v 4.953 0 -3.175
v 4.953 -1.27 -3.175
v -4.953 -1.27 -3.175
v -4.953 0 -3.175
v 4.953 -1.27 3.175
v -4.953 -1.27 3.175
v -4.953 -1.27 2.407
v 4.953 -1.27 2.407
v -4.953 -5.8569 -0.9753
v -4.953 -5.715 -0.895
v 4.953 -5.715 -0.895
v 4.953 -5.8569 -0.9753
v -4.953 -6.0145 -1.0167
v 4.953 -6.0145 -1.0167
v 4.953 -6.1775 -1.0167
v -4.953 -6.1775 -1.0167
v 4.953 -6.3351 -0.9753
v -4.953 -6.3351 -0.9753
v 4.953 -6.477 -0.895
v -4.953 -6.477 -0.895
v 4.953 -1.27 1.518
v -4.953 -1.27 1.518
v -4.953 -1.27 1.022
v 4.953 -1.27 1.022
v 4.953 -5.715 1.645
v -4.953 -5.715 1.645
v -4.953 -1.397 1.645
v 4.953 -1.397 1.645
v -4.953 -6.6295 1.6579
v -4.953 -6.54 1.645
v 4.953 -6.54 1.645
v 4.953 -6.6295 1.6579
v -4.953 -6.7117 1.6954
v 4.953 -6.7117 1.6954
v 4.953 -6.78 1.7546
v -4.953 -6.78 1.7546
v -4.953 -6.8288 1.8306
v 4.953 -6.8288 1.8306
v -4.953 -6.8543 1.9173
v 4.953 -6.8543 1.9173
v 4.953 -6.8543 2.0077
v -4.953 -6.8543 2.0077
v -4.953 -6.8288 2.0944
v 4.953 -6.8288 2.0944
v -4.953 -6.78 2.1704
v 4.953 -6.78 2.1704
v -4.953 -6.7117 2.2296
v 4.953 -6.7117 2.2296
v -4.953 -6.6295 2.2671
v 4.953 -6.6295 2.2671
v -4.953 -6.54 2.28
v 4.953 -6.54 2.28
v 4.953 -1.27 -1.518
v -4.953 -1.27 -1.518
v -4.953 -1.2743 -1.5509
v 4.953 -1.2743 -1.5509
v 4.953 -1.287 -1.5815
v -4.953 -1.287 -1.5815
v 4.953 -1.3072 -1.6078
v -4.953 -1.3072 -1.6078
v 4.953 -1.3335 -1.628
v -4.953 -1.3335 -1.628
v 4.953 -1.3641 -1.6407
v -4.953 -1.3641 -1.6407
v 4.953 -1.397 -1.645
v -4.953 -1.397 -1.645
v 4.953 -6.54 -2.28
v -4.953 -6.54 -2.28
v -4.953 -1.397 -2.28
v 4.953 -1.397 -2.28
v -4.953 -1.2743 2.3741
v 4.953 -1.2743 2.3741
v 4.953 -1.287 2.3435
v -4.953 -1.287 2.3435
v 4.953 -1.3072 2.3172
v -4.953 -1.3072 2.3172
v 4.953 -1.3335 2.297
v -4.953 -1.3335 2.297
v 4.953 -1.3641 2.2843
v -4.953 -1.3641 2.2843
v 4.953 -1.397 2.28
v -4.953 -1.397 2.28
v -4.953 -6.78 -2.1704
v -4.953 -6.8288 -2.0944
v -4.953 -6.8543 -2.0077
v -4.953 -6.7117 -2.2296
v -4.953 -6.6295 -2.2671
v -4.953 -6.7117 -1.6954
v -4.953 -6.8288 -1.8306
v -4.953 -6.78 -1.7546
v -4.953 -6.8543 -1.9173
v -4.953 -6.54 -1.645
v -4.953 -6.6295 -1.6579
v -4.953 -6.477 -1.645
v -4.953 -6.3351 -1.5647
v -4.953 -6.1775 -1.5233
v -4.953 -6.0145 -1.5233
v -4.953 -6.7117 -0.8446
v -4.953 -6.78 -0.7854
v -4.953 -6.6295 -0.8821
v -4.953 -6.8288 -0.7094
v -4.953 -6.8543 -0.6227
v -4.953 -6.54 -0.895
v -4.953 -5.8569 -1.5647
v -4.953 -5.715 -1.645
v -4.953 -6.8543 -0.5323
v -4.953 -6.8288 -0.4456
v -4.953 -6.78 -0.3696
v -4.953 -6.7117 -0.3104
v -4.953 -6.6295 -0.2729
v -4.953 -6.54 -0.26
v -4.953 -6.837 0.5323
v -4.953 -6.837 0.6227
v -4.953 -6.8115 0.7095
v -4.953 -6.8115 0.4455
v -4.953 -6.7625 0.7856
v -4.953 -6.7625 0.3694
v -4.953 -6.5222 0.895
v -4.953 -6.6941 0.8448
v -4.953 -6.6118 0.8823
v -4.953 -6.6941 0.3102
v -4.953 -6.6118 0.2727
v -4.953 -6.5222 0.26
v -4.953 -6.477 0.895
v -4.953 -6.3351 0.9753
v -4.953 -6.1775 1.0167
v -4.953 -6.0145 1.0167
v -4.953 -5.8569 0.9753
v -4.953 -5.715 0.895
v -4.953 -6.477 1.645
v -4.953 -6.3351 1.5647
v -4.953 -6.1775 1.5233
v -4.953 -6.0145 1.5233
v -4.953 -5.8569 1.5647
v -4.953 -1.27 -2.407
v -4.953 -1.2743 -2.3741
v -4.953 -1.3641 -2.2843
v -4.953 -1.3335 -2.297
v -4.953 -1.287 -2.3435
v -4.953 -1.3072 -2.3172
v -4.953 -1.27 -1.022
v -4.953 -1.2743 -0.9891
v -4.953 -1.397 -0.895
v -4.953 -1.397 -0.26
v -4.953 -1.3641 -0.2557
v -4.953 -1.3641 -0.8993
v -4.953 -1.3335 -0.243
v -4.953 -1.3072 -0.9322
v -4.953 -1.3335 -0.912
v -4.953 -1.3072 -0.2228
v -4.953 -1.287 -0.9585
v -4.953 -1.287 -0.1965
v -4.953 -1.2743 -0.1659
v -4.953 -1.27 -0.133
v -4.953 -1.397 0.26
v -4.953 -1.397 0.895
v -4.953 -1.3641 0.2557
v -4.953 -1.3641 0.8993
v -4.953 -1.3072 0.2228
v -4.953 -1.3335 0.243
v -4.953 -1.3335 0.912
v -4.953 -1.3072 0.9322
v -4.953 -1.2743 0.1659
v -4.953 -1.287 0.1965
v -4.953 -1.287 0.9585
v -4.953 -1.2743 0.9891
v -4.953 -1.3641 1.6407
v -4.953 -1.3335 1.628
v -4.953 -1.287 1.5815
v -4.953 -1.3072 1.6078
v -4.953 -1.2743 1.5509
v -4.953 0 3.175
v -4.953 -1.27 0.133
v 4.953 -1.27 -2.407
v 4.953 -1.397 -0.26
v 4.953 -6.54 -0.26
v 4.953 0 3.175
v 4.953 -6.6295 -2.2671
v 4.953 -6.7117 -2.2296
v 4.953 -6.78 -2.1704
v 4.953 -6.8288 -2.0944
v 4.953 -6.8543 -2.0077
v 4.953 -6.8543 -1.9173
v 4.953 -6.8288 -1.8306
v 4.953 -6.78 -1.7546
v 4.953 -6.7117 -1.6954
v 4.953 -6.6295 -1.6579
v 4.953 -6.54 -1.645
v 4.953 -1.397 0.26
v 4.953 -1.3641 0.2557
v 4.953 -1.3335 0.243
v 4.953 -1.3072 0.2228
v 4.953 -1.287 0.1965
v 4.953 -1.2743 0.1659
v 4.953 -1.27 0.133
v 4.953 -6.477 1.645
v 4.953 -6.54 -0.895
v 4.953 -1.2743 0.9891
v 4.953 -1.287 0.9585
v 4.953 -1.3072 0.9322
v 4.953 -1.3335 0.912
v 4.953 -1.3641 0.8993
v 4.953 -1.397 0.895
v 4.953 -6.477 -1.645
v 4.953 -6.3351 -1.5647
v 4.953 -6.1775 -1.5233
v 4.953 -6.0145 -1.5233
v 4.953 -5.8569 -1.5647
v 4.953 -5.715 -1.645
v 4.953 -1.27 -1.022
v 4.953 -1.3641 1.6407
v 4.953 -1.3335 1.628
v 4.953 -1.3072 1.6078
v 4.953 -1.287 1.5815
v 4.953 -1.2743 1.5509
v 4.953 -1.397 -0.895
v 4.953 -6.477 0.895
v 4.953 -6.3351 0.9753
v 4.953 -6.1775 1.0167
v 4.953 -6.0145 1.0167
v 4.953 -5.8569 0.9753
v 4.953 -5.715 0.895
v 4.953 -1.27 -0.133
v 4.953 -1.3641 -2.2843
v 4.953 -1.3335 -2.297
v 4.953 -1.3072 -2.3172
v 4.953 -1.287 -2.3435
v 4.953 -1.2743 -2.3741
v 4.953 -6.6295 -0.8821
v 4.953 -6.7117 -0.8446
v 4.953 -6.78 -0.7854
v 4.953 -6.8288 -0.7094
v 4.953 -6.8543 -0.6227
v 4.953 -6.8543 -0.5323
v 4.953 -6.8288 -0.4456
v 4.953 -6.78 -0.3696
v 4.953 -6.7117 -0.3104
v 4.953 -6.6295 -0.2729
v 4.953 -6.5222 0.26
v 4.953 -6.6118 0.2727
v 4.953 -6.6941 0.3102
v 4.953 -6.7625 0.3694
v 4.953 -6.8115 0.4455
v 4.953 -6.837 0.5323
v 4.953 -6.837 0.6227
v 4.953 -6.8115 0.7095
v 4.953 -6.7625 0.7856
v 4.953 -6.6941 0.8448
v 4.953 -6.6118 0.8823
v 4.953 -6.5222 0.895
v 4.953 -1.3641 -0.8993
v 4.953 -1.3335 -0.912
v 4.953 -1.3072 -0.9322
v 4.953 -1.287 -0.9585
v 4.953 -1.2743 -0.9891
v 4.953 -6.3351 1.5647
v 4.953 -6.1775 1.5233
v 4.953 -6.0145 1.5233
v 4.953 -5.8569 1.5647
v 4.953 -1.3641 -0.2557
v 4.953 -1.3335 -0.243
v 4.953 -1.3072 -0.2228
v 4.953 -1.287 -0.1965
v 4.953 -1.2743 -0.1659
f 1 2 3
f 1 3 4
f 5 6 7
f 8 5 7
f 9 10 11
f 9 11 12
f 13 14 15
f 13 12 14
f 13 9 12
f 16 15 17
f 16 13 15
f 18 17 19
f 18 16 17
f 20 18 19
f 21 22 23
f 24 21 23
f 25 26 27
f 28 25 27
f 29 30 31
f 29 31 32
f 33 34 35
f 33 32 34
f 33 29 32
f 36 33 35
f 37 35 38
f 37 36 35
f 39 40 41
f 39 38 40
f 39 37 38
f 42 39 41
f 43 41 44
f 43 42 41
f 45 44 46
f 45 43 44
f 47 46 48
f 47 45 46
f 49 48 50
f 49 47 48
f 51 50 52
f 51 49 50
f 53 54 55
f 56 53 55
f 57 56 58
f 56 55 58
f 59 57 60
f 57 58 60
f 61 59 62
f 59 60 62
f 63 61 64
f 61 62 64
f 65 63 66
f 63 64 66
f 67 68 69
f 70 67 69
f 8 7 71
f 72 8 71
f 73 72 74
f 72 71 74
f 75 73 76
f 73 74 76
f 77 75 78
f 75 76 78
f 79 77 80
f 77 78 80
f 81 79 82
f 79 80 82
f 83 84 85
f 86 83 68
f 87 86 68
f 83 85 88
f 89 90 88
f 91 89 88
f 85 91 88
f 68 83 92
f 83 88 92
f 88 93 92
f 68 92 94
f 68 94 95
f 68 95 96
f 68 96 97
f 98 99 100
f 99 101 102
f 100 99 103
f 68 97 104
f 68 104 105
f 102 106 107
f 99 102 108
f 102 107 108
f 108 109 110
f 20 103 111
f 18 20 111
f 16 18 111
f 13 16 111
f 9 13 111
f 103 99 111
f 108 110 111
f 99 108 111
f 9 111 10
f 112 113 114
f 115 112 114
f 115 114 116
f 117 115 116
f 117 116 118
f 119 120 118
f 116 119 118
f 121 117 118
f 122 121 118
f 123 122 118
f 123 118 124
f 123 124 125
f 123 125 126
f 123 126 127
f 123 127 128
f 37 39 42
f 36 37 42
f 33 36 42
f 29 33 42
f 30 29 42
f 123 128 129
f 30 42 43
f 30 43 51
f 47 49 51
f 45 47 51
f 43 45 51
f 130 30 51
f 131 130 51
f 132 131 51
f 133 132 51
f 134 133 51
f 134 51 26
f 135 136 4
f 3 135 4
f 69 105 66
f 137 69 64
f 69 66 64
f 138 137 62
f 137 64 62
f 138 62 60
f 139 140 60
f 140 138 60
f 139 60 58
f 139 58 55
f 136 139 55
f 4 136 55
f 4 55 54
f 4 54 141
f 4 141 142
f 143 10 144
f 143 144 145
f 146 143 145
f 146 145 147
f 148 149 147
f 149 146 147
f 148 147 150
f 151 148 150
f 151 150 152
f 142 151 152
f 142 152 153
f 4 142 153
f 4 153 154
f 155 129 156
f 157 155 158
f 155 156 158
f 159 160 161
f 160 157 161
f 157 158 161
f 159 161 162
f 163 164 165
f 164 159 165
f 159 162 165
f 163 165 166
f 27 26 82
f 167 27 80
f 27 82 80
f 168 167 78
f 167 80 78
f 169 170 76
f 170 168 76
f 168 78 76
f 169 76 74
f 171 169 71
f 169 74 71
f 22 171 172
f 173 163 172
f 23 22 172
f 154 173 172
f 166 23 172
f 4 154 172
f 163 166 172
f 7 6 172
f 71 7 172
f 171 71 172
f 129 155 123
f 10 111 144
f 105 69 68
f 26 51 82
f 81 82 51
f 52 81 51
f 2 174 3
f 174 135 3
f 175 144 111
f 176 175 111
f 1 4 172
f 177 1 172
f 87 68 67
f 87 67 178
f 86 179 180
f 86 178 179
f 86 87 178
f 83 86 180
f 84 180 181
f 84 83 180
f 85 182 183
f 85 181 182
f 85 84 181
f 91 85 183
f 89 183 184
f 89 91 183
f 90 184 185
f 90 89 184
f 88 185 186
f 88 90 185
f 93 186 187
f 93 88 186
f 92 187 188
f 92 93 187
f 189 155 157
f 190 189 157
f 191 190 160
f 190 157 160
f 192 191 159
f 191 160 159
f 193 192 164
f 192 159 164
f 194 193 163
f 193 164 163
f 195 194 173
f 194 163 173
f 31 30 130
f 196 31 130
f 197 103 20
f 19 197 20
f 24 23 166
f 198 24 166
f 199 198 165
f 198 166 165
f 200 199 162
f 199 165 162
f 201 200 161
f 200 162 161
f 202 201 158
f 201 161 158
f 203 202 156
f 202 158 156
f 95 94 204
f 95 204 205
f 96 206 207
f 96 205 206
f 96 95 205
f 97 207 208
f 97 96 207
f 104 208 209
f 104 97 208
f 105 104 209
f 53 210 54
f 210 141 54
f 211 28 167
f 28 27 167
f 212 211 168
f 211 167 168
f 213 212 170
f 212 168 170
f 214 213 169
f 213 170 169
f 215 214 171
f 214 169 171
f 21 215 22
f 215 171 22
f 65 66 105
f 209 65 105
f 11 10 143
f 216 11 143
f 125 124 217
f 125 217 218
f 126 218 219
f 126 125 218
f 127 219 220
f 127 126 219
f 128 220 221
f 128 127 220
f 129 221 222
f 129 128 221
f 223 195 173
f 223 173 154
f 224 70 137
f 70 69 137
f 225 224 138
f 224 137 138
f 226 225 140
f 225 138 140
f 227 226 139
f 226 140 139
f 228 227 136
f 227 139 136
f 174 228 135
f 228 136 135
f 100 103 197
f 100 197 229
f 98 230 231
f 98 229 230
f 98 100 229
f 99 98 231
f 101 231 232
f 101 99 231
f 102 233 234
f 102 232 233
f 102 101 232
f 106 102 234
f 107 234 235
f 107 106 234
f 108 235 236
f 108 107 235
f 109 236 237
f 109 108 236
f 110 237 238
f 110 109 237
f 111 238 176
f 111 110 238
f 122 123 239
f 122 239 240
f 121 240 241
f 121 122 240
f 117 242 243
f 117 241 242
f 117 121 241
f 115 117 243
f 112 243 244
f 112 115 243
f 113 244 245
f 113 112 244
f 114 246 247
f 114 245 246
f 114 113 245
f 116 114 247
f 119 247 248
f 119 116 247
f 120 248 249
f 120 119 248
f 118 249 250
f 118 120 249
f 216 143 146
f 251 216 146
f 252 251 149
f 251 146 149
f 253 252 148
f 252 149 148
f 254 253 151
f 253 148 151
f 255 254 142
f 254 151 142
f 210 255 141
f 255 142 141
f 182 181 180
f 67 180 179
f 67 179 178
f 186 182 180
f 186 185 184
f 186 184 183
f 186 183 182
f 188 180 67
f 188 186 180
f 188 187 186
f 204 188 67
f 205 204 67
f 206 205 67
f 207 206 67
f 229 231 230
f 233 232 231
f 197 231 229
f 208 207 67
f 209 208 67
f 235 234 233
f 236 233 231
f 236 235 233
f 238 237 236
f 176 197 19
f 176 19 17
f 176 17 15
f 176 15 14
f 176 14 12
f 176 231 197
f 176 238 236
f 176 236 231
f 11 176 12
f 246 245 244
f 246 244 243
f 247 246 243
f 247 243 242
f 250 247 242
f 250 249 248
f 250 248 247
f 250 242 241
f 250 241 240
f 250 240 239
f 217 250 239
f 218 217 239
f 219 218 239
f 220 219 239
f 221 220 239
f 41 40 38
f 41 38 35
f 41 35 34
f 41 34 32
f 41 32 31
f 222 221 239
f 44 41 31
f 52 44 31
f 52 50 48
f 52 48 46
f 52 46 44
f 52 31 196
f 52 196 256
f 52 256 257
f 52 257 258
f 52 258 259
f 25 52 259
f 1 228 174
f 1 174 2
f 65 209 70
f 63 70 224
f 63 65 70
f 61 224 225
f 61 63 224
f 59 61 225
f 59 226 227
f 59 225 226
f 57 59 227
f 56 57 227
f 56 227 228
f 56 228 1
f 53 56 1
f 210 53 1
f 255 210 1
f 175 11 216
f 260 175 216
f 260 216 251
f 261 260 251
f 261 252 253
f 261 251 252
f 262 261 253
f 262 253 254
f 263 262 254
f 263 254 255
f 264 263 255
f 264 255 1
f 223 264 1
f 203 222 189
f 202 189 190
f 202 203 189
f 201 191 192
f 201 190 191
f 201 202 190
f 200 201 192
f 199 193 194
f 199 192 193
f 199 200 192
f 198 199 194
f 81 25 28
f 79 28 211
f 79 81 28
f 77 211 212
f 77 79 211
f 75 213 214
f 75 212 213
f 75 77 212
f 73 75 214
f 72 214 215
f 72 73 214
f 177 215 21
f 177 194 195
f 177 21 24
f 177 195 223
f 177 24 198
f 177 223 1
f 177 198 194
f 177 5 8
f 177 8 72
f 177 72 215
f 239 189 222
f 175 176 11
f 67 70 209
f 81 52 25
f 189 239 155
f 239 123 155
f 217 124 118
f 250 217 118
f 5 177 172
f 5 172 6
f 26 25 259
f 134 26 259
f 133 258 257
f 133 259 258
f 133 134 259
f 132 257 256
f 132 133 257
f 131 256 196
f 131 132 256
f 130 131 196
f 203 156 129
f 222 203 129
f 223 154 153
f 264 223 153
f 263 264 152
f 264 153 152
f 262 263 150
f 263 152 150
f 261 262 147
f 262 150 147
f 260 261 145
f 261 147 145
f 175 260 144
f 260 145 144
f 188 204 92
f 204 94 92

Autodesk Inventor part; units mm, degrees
sketch "Sketch_6" plane through (0, 0, 0) normal (1, 0, 0) x (0, 1, 0)
  line L0 (0, 3.175) -> (-1.27, 3.175)
  line L1 (-1.27, 3.175) -> (-1.27, 2.407)
  arc A0 (-1.397, 2.28) -> (-1.27, 2.407) centre (-1.397, 2.407) ccw
  line L2 (-1.397, 2.28) -> (-6.54, 2.28)
  arc A1 (-6.54, 2.28) -> (-6.54, 1.645) centre (-6.54, 1.9625) ccw
  line L3 (-6.54, 1.645) -> (-6.477, 1.645)
  arc A2 (-6.477, 1.645) -> (-5.715, 1.645) centre (-6.096, 2.153) ccw
  line L4 (-5.715, 1.645) -> (-1.397, 1.645)
  arc A3 (-1.27, 1.518) -> (-1.397, 1.645) centre (-1.397, 1.518) ccw
  line L5 (-1.27, 1.518) -> (-1.27, 1.022)
  arc A4 (-1.397, 0.895) -> (-1.27, 1.022) centre (-1.397, 1.022) ccw
  line L6 (-1.397, 0.895) -> (-5.715, 0.895)
  arc A5 (-5.715, 0.895) -> (-6.477, 0.895) centre (-6.096, 0.387) ccw
  line L7 (-6.477, 0.895) -> (-6.5222, 0.895)
  arc A6 (-6.5222, 0.895) -> (-6.5222, 0.26) centre (-6.5227, 0.5775) ccw
  line L8 (-6.5222, 0.26) -> (-1.397, 0.26)
  arc A7 (-1.27, 0.133) -> (-1.397, 0.26) centre (-1.397, 0.133) ccw
  line L9 (-1.27, 0.133) -> (-1.27, -0.133)
  arc A8 (-1.397, -0.26) -> (-1.27, -0.133) centre (-1.397, -0.133) ccw
  line L10 (-1.397, -0.26) -> (-6.54, -0.26)
  arc A9 (-6.54, -0.26) -> (-6.54, -0.895) centre (-6.54, -0.5775) ccw
  line L11 (-6.54, -0.895) -> (-6.477, -0.895)
  arc A10 (-6.477, -0.895) -> (-5.715, -0.895) centre (-6.096, -0.387) ccw
  line L12 (-5.715, -0.895) -> (-1.397, -0.895)
  arc A11 (-1.27, -1.022) -> (-1.397, -0.895) centre (-1.397, -1.022) ccw
  line L13 (-1.27, -1.022) -> (-1.27, -1.518)
  arc A12 (-1.397, -1.645) -> (-1.27, -1.518) centre (-1.397, -1.518) ccw
  line L14 (-1.397, -1.645) -> (-5.715, -1.645)
  arc A13 (-5.715, -1.645) -> (-6.477, -1.645) centre (-6.096, -2.153) ccw
  line L15 (-6.477, -1.645) -> (-6.54, -1.645)
  arc A14 (-6.54, -1.645) -> (-6.54, -2.28) centre (-6.54, -1.9625) ccw
  line L16 (-6.54, -2.28) -> (-1.397, -2.28)
  arc A15 (-1.27, -2.407) -> (-1.397, -2.28) centre (-1.397, -2.407) ccw
  line L17 (-1.27, -2.407) -> (-1.27, -3.175)
  line L18 (-1.27, -3.175) -> (0, -3.175)
  line L19 (0, -3.175) -> (0, 3.175)
extrude "Extrusion1" add sketch "Sketch_6" along normal mid plane 9.906
ref_plane "pick_place_pad_XY" through (0, 0, 0) normal (0, 1, 0) x (1, 0, 0)
ref_plane "pick_place_pad_YZ" through (0, 0, 0) normal (1, 0, 0) x (0, 0, -1)
ref_plane "pick_place_pad_ZX" through (0, 0, 0) normal (0, 0, -1) x (0, 1, 0)
properties part number "PPP-06-01-20--DV"
